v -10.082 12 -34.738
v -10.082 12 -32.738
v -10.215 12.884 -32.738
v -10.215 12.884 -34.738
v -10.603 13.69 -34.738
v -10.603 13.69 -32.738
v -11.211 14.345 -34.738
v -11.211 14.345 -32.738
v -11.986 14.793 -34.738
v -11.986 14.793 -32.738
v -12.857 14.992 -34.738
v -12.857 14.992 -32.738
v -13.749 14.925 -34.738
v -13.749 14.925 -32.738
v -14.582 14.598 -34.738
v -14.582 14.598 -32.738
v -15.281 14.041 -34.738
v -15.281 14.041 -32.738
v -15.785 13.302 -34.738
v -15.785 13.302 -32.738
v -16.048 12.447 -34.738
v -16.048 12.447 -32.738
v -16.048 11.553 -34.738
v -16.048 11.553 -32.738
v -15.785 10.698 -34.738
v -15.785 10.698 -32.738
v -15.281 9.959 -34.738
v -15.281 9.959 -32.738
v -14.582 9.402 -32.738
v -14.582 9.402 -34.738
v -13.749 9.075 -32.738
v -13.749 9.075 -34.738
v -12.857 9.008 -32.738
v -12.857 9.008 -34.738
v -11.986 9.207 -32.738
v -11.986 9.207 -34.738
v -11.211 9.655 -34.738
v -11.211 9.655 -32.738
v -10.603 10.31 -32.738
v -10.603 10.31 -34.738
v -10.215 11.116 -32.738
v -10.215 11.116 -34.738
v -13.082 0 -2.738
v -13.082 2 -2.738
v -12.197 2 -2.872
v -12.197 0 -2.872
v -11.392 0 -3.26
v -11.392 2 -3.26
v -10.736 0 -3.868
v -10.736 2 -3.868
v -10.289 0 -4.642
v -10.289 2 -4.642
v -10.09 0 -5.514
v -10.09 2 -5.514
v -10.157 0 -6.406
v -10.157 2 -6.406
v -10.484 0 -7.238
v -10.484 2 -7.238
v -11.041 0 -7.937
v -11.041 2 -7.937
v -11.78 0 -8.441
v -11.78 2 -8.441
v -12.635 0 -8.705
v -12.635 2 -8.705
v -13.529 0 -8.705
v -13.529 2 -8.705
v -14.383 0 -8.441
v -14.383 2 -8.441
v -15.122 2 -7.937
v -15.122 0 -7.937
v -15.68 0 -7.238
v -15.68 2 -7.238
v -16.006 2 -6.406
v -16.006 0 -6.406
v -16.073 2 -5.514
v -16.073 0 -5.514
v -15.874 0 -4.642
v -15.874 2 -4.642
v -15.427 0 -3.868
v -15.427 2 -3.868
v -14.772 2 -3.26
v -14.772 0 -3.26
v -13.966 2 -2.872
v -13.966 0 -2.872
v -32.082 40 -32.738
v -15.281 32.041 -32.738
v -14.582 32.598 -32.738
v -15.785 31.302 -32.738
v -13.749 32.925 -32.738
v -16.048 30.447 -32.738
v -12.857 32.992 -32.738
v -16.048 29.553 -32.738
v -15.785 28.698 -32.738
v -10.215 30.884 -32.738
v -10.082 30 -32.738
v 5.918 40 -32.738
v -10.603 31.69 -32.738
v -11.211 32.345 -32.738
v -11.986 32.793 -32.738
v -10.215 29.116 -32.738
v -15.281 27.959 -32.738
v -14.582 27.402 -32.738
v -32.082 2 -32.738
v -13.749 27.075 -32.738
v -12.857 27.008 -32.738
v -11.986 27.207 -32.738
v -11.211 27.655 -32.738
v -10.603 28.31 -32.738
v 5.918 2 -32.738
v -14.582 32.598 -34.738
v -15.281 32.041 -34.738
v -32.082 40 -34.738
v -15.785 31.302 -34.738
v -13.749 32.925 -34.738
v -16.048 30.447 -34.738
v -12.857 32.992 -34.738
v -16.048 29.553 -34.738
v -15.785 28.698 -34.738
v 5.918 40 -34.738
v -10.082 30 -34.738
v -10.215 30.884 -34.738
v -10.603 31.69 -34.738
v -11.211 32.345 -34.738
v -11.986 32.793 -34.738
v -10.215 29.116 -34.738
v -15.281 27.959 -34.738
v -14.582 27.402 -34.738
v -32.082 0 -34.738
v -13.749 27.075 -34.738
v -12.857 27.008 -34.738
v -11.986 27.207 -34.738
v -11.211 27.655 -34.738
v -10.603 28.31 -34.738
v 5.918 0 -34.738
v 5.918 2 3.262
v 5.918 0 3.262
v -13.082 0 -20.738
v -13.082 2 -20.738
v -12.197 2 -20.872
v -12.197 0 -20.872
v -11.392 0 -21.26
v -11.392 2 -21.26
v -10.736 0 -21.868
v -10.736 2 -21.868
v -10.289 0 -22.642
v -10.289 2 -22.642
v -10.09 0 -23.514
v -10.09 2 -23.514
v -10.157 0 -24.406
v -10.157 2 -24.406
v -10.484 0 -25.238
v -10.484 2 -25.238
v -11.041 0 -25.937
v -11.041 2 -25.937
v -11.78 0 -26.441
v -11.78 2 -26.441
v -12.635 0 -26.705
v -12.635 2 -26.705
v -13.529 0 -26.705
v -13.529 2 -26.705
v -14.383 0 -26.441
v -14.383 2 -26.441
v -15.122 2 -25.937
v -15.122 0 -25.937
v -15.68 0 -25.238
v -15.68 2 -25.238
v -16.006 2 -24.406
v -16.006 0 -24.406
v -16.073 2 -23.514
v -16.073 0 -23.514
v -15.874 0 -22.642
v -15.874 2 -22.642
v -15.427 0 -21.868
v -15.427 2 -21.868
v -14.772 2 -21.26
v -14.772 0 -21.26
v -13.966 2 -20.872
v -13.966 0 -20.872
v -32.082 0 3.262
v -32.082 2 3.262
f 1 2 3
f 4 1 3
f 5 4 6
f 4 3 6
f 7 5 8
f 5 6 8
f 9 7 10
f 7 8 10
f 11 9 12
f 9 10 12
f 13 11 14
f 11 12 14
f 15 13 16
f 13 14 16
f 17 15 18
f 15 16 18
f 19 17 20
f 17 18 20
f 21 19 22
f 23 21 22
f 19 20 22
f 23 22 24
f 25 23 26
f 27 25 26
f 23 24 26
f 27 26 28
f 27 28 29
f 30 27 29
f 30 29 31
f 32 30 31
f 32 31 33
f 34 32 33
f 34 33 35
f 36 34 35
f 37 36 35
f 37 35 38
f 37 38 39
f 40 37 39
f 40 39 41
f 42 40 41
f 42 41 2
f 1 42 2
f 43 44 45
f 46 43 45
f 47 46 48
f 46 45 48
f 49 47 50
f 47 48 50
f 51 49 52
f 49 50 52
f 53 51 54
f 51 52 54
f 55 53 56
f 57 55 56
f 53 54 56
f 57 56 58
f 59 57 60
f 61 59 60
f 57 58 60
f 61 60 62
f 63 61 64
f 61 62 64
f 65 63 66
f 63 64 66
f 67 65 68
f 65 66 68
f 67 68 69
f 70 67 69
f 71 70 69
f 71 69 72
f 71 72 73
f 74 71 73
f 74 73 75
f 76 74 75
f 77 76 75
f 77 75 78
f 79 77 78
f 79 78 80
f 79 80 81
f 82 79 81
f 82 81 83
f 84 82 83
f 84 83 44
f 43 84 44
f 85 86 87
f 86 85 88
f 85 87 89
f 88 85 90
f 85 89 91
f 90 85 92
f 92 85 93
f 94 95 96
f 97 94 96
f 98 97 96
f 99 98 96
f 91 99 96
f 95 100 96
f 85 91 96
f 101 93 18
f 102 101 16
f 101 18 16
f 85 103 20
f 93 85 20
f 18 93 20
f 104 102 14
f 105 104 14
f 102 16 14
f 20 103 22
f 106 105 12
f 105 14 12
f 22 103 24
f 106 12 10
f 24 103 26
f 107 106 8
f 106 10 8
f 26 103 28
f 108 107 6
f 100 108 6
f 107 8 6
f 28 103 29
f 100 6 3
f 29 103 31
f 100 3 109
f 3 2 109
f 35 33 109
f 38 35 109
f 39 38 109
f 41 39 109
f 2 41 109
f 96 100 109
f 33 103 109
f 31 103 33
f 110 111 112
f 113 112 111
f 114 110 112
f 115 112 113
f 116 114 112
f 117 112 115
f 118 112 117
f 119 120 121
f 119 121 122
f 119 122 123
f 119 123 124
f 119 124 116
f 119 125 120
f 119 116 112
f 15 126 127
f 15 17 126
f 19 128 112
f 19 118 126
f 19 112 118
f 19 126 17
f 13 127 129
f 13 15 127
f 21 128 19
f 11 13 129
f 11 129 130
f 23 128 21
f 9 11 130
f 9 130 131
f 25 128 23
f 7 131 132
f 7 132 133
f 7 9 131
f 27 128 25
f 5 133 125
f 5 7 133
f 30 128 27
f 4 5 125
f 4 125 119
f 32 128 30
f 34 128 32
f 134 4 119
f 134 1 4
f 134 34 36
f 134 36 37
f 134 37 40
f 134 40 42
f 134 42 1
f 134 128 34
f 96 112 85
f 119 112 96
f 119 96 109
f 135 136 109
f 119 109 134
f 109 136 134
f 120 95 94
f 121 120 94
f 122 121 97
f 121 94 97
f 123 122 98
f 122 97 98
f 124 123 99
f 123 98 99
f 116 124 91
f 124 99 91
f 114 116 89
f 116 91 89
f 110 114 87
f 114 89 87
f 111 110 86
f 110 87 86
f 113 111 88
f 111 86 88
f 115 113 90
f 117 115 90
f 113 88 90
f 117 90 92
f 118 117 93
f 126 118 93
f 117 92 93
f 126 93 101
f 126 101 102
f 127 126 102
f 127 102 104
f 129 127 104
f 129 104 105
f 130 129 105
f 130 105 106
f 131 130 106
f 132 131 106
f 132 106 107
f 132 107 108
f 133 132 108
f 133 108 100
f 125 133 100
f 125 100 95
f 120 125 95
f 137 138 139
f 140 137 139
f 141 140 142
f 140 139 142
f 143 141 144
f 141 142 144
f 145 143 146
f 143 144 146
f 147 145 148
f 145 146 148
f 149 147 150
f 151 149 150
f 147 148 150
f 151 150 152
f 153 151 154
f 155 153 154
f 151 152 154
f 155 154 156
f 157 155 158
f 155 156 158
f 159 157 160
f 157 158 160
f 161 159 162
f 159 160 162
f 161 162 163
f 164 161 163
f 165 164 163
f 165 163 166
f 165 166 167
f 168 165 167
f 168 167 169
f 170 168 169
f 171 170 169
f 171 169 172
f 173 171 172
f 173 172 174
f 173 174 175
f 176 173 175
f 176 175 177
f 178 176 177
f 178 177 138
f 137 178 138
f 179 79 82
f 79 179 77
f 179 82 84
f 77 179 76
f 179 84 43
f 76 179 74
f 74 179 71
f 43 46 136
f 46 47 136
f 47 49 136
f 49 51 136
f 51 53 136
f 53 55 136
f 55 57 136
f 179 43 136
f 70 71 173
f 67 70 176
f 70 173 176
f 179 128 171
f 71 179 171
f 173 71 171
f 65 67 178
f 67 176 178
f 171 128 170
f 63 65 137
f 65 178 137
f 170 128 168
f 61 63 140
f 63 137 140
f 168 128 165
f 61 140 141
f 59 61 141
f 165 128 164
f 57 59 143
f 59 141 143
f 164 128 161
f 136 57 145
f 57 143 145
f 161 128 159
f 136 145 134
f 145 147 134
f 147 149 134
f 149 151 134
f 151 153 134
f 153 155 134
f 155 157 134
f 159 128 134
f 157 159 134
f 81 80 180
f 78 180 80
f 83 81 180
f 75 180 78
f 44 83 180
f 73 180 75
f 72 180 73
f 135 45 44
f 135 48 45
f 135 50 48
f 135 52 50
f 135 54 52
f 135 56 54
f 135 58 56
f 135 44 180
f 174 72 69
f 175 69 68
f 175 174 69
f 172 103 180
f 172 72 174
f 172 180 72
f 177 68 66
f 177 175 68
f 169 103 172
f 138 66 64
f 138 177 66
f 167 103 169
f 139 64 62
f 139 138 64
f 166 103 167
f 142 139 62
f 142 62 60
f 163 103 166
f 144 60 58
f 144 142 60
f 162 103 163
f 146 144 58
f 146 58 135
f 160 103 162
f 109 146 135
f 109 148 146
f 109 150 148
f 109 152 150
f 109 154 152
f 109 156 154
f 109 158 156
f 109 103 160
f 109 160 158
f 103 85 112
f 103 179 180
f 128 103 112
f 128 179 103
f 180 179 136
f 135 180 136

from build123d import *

# Parameters (mm, degrees)
SKETCH1_W           = 38
SKETCH1_H           = 38
BOSS_EXTRUDE1_DEPTH = 2
SKETCH2_W           = 38
SKETCH2_H           = 2
BOSS_EXTRUDE2_DEPTH = 38
SKETCH3_R           = 3
CUT_EXTRUDE1_DEPTH  = 10
SKETCH4_R           = 3
CUT_EXTRUDE2_DEPTH  = 10


with BuildPart() as part:
    # Sketch1 → Boss-Extrude1 (new body)
    with BuildSketch(Plane(origin=(0, 0, 0), x_dir=(1, 0, 0), z_dir=(0, 1, 0))):
        with Locations((-13.081650622, 15.738235294)):
            Rectangle(SKETCH1_W, SKETCH1_H)
    extrude(amount=BOSS_EXTRUDE1_DEPTH)

    # Sketch2 → Boss-Extrude2 (add)
    with BuildSketch(Plane(origin=(0, 2, 0), x_dir=(1, 0, 0), z_dir=(0, 1, 0))):
        with Locations((-13.081650622, 33.738235294)):
            Rectangle(SKETCH2_W, SKETCH2_H)
    extrude(amount=BOSS_EXTRUDE2_DEPTH)

    # Sketch3 → Cut-Extrude1 (cut)
    with BuildSketch(Plane.XY.offset(-32.738235294)):
        with Locations((-13.081650622, 30)):
            Circle(SKETCH3_R)
        with Locations((-13.081650622, 12)):
            Circle(SKETCH3_R)
    extrude(amount=-CUT_EXTRUDE1_DEPTH, mode=Mode.SUBTRACT)

    # Sketch4 → Cut-Extrude2 (cut)
    with BuildSketch(Plane(origin=(0, 2, 0), x_dir=(1, 0, 0), z_dir=(0, 1, 0))):
        with Locations(Location((-13.081650622, 5.738235294, 0), (0, 0, 270))):
            Circle(SKETCH4_R)
        with Locations(Location((-13.081650622, 23.738235294, 0), (0, 0, 270))):
            Circle(SKETCH4_R)
    extrude(amount=-CUT_EXTRUDE2_DEPTH, mode=Mode.SUBTRACT)


solid = part.part
